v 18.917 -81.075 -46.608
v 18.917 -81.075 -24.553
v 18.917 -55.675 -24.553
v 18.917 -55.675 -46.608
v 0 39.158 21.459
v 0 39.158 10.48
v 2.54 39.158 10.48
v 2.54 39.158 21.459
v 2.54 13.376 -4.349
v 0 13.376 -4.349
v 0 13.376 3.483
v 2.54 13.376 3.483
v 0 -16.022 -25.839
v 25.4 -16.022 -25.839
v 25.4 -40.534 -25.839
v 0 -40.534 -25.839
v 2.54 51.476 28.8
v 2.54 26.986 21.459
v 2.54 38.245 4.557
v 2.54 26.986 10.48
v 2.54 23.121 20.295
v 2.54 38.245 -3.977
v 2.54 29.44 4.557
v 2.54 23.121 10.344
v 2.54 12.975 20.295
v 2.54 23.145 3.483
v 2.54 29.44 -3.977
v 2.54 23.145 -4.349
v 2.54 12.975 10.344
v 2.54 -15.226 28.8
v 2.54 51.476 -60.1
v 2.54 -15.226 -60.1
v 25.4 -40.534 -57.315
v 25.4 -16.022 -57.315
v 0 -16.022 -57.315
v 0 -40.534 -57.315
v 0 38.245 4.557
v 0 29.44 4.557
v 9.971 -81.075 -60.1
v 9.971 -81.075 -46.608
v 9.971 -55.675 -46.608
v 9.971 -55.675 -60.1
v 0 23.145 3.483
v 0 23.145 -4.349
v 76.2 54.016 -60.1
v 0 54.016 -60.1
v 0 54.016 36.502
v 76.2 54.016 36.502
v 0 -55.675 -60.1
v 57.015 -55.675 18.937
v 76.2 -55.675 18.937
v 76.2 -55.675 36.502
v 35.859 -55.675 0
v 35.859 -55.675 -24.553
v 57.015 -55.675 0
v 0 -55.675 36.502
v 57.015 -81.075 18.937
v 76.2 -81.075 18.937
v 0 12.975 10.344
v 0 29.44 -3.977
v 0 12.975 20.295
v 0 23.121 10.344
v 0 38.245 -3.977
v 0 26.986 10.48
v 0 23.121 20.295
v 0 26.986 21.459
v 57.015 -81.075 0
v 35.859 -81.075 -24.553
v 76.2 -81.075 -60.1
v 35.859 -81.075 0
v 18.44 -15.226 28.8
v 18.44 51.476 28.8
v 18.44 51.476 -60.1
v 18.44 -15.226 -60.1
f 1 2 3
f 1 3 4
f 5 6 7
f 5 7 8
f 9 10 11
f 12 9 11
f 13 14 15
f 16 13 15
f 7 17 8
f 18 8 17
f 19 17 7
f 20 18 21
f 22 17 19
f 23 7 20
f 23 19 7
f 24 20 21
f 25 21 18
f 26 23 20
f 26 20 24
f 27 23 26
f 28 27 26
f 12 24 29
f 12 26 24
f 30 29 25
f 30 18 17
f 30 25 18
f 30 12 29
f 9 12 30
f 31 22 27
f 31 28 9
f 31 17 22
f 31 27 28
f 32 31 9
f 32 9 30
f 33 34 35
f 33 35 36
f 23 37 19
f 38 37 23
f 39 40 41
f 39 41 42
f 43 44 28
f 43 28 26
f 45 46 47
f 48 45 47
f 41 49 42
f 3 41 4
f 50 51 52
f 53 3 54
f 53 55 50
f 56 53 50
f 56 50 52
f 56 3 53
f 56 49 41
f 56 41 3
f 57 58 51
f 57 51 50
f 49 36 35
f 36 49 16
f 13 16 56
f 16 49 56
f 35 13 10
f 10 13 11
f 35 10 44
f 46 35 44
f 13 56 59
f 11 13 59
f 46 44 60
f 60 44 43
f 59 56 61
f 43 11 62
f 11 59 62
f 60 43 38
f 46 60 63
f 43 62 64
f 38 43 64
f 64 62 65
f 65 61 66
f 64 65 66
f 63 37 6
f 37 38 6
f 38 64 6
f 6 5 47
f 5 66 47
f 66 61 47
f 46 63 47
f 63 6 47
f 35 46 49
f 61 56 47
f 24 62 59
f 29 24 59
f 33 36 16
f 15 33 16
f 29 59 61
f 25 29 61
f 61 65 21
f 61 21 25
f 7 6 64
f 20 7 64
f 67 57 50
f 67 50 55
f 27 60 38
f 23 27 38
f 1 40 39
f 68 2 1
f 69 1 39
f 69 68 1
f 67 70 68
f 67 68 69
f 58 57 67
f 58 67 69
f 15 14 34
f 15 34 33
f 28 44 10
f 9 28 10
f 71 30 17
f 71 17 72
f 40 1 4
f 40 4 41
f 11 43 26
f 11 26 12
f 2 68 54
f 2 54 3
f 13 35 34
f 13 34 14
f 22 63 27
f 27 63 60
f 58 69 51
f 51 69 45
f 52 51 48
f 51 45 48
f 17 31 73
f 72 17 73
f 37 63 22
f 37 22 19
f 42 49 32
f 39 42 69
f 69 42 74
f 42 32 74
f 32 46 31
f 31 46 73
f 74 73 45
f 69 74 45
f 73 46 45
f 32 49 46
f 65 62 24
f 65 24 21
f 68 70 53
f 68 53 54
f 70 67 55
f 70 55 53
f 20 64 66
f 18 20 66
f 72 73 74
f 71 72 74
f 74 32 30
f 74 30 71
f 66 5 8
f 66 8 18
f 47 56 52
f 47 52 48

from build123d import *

# Parameters (mm, degrees)
F0_W      = 109.69113186
F0_H      = 96.6019369662
F1_DEPTH  = 76.2
F3_DEPTH  = 25.4
F4_W      = 12.1712684631
F4_H      = 10.9790135175
F4_W_2    = 8.8049545884
F4_H_2    = 8.5344947875
F4_W_3    = 9.7688166425
F4_H_3    = 7.8319623135
F4_W_4    = 10.1457694545
F4_H_4    = 9.9510354921
F5_DEPTH  = 12.7
F7_W      = 24.5119724423
F7_H      = 31.4762387425
F8_DEPTH  = 25.4
F9_W      = 15.9004002785
F9_H      = 66.7022062786
F10_DEPTH = 88.9


with BuildPart() as f1:
    # F0 (on Right) → F1 (new body)
    with BuildSketch(Plane.YZ):
        with Locations((-0.8295942098, -11.7987114936)):
            Rectangle(F0_W, F0_H)
    extrude(amount=F1_DEPTH)

    # F2 (on face) → F3 (join)
    with BuildSketch(Plane.XZ.offset(55.6751601398)):
        Polygon((76.2, -60.0996799767), (76.2, 18.9372822642), (57.0150315762, 18.9372822642), (57.0150315762, 0), (35.8594097197, 0), (35.8594097197, -24.5528668165), (18.9174246043, -24.5528668165), (18.9174246043, -46.6084964573), (9.9709145725, -46.6084964573), (9.9709145725, -60.0996799767), align=None)
    extrude(amount=F3_DEPTH)

    # F4 (on face) → F5 (cut)
    with BuildSketch(Plane(origin=(0, 0, 0), x_dir=(0, -1, 0), z_dir=(-1, 0, 0))):
        with Locations((-33.0719724298, 15.969437547)):
            Rectangle(F4_W, F4_H)
        with Locations((-33.8424704969, 0.289965421)):
            Rectangle(F4_W_2, F4_H_2)
        with Locations((-18.260889221, -0.4326736089)):
            Rectangle(F4_W_3, F4_H_3)
        with Locations((-18.0477141403, 15.3193497099)):
            Rectangle(F4_W_4, F4_H_4)
    extrude(amount=-F5_DEPTH, mode=Mode.SUBTRACT)

    # F7 (on face) → F8 (cut)
    with BuildSketch(Plane(origin=(0, 0, 0), x_dir=(0, -1, 0), z_dir=(-1, 0, 0))):
        with Locations((28.2782753929, -41.5770960972)):
            Rectangle(F7_W, F7_H)
    extrude(amount=-F8_DEPTH, mode=Mode.SUBTRACT)

    # F9 (on face) → F10 (cut)
    with BuildSketch(Plane(origin=(0, 0, -60.0996799767), x_dir=(1, 0, 0), z_dir=(0, 0, -1))):
        with Locations((10.4902001393, -18.1248685809)):
            Rectangle(F9_W, F9_H)
    extrude(amount=-F10_DEPTH, mode=Mode.SUBTRACT)


solid = f1.part
